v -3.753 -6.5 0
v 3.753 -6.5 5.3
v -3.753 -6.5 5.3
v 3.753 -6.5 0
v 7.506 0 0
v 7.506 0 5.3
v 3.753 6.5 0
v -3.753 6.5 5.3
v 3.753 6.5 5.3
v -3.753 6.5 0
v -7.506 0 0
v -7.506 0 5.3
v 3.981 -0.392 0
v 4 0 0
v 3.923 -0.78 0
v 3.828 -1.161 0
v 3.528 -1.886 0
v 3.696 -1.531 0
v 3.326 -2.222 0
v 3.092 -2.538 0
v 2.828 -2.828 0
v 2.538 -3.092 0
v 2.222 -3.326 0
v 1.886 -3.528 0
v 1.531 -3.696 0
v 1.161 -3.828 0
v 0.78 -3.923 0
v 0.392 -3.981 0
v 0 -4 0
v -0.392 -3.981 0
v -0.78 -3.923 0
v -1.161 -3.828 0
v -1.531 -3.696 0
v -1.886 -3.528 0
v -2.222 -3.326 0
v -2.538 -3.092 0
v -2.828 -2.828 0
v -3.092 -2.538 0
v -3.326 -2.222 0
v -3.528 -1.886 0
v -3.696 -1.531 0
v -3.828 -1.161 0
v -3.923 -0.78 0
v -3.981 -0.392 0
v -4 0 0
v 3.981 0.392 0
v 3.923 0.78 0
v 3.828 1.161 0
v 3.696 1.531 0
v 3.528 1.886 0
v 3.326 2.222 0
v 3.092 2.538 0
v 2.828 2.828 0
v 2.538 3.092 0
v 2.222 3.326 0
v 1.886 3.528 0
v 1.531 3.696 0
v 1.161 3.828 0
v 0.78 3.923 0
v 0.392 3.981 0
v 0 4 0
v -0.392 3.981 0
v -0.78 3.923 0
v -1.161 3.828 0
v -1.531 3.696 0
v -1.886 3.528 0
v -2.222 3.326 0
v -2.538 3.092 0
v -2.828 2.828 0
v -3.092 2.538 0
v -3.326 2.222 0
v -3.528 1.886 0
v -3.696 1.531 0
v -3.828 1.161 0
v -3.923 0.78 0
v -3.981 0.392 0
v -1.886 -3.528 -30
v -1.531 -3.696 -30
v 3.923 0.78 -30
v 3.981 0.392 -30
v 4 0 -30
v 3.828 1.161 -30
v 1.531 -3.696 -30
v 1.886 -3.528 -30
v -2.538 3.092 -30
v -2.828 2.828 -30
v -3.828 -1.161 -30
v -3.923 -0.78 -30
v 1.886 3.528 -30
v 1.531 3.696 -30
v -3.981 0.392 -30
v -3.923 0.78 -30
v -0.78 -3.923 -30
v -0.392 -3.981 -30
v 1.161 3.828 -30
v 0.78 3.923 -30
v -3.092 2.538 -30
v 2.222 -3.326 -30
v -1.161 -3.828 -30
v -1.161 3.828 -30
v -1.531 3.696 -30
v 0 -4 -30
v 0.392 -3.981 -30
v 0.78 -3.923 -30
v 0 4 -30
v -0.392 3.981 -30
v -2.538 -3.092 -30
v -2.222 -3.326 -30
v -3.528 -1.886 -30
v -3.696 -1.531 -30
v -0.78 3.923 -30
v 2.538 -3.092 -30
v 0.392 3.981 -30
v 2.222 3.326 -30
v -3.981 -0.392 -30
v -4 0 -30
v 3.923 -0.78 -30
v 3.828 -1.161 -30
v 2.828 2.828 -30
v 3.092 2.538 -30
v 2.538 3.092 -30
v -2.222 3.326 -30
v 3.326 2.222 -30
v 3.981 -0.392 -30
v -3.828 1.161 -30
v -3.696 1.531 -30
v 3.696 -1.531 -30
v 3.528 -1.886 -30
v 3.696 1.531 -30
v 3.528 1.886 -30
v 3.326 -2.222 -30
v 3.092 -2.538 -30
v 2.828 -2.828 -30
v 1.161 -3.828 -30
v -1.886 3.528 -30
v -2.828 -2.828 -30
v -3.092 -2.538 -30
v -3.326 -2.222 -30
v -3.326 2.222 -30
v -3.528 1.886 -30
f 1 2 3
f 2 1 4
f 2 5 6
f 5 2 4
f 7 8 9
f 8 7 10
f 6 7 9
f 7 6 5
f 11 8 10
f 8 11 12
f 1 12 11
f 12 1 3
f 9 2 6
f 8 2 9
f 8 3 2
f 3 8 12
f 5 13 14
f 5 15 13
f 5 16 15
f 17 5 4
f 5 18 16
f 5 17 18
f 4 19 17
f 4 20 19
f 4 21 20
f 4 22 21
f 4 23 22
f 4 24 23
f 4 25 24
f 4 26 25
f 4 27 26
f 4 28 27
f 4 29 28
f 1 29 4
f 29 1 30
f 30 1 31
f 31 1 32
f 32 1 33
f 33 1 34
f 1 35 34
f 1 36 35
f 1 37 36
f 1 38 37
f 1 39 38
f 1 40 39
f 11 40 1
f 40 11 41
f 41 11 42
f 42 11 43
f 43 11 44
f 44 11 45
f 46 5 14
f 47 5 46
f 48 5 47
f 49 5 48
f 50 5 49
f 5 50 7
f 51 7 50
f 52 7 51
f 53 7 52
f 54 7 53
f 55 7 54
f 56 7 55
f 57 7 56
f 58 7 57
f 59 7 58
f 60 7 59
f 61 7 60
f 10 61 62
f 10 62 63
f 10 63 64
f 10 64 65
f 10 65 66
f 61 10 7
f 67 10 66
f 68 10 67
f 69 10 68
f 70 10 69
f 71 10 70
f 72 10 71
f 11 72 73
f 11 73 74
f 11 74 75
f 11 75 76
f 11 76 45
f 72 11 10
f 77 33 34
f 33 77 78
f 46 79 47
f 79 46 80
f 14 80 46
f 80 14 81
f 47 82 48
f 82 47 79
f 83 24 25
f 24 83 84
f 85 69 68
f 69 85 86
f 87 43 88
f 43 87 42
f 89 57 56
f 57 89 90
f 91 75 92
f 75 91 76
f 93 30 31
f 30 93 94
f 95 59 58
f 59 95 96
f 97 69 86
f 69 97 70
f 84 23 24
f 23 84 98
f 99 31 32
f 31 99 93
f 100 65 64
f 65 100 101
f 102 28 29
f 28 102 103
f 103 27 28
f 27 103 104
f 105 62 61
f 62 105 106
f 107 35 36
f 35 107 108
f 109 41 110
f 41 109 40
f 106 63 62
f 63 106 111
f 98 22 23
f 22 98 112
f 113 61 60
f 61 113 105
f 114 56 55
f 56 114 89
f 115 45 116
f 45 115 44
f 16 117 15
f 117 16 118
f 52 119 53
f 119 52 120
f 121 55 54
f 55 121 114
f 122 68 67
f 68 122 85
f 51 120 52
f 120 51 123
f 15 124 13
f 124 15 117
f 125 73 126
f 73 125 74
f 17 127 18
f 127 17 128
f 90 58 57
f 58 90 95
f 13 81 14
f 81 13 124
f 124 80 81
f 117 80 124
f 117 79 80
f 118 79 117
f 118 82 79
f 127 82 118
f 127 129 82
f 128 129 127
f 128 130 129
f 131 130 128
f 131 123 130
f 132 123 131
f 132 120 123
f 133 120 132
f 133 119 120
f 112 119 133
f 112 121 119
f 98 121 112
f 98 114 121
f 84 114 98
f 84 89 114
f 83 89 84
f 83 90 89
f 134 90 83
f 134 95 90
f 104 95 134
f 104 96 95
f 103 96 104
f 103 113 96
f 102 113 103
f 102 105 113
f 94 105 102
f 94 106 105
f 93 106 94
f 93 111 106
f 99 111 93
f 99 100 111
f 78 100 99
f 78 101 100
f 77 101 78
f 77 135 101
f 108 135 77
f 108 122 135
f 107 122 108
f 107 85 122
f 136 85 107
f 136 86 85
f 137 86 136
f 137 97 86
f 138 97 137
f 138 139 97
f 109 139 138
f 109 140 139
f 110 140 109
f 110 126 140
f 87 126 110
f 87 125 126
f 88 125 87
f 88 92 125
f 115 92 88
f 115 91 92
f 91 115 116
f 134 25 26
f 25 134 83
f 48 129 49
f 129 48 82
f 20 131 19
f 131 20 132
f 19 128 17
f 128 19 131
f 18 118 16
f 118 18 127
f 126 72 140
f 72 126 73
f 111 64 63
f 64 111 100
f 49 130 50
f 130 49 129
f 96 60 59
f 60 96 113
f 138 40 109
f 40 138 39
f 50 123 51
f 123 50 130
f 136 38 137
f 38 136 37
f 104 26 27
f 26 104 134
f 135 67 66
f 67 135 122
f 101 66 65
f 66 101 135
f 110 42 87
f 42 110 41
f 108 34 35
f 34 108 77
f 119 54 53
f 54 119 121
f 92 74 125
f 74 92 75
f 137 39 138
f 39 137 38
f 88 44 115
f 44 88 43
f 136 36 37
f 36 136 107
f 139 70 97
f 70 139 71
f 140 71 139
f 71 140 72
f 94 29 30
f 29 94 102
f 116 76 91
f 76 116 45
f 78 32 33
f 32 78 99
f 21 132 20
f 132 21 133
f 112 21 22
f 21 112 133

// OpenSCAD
$fn = 64;
union() {
    cylinder(h = 5.3, r = 13 / sqrt(3), $fn = 6);
    translate([0, 0, -30])
        cylinder(h = 30, r = 4);
}
